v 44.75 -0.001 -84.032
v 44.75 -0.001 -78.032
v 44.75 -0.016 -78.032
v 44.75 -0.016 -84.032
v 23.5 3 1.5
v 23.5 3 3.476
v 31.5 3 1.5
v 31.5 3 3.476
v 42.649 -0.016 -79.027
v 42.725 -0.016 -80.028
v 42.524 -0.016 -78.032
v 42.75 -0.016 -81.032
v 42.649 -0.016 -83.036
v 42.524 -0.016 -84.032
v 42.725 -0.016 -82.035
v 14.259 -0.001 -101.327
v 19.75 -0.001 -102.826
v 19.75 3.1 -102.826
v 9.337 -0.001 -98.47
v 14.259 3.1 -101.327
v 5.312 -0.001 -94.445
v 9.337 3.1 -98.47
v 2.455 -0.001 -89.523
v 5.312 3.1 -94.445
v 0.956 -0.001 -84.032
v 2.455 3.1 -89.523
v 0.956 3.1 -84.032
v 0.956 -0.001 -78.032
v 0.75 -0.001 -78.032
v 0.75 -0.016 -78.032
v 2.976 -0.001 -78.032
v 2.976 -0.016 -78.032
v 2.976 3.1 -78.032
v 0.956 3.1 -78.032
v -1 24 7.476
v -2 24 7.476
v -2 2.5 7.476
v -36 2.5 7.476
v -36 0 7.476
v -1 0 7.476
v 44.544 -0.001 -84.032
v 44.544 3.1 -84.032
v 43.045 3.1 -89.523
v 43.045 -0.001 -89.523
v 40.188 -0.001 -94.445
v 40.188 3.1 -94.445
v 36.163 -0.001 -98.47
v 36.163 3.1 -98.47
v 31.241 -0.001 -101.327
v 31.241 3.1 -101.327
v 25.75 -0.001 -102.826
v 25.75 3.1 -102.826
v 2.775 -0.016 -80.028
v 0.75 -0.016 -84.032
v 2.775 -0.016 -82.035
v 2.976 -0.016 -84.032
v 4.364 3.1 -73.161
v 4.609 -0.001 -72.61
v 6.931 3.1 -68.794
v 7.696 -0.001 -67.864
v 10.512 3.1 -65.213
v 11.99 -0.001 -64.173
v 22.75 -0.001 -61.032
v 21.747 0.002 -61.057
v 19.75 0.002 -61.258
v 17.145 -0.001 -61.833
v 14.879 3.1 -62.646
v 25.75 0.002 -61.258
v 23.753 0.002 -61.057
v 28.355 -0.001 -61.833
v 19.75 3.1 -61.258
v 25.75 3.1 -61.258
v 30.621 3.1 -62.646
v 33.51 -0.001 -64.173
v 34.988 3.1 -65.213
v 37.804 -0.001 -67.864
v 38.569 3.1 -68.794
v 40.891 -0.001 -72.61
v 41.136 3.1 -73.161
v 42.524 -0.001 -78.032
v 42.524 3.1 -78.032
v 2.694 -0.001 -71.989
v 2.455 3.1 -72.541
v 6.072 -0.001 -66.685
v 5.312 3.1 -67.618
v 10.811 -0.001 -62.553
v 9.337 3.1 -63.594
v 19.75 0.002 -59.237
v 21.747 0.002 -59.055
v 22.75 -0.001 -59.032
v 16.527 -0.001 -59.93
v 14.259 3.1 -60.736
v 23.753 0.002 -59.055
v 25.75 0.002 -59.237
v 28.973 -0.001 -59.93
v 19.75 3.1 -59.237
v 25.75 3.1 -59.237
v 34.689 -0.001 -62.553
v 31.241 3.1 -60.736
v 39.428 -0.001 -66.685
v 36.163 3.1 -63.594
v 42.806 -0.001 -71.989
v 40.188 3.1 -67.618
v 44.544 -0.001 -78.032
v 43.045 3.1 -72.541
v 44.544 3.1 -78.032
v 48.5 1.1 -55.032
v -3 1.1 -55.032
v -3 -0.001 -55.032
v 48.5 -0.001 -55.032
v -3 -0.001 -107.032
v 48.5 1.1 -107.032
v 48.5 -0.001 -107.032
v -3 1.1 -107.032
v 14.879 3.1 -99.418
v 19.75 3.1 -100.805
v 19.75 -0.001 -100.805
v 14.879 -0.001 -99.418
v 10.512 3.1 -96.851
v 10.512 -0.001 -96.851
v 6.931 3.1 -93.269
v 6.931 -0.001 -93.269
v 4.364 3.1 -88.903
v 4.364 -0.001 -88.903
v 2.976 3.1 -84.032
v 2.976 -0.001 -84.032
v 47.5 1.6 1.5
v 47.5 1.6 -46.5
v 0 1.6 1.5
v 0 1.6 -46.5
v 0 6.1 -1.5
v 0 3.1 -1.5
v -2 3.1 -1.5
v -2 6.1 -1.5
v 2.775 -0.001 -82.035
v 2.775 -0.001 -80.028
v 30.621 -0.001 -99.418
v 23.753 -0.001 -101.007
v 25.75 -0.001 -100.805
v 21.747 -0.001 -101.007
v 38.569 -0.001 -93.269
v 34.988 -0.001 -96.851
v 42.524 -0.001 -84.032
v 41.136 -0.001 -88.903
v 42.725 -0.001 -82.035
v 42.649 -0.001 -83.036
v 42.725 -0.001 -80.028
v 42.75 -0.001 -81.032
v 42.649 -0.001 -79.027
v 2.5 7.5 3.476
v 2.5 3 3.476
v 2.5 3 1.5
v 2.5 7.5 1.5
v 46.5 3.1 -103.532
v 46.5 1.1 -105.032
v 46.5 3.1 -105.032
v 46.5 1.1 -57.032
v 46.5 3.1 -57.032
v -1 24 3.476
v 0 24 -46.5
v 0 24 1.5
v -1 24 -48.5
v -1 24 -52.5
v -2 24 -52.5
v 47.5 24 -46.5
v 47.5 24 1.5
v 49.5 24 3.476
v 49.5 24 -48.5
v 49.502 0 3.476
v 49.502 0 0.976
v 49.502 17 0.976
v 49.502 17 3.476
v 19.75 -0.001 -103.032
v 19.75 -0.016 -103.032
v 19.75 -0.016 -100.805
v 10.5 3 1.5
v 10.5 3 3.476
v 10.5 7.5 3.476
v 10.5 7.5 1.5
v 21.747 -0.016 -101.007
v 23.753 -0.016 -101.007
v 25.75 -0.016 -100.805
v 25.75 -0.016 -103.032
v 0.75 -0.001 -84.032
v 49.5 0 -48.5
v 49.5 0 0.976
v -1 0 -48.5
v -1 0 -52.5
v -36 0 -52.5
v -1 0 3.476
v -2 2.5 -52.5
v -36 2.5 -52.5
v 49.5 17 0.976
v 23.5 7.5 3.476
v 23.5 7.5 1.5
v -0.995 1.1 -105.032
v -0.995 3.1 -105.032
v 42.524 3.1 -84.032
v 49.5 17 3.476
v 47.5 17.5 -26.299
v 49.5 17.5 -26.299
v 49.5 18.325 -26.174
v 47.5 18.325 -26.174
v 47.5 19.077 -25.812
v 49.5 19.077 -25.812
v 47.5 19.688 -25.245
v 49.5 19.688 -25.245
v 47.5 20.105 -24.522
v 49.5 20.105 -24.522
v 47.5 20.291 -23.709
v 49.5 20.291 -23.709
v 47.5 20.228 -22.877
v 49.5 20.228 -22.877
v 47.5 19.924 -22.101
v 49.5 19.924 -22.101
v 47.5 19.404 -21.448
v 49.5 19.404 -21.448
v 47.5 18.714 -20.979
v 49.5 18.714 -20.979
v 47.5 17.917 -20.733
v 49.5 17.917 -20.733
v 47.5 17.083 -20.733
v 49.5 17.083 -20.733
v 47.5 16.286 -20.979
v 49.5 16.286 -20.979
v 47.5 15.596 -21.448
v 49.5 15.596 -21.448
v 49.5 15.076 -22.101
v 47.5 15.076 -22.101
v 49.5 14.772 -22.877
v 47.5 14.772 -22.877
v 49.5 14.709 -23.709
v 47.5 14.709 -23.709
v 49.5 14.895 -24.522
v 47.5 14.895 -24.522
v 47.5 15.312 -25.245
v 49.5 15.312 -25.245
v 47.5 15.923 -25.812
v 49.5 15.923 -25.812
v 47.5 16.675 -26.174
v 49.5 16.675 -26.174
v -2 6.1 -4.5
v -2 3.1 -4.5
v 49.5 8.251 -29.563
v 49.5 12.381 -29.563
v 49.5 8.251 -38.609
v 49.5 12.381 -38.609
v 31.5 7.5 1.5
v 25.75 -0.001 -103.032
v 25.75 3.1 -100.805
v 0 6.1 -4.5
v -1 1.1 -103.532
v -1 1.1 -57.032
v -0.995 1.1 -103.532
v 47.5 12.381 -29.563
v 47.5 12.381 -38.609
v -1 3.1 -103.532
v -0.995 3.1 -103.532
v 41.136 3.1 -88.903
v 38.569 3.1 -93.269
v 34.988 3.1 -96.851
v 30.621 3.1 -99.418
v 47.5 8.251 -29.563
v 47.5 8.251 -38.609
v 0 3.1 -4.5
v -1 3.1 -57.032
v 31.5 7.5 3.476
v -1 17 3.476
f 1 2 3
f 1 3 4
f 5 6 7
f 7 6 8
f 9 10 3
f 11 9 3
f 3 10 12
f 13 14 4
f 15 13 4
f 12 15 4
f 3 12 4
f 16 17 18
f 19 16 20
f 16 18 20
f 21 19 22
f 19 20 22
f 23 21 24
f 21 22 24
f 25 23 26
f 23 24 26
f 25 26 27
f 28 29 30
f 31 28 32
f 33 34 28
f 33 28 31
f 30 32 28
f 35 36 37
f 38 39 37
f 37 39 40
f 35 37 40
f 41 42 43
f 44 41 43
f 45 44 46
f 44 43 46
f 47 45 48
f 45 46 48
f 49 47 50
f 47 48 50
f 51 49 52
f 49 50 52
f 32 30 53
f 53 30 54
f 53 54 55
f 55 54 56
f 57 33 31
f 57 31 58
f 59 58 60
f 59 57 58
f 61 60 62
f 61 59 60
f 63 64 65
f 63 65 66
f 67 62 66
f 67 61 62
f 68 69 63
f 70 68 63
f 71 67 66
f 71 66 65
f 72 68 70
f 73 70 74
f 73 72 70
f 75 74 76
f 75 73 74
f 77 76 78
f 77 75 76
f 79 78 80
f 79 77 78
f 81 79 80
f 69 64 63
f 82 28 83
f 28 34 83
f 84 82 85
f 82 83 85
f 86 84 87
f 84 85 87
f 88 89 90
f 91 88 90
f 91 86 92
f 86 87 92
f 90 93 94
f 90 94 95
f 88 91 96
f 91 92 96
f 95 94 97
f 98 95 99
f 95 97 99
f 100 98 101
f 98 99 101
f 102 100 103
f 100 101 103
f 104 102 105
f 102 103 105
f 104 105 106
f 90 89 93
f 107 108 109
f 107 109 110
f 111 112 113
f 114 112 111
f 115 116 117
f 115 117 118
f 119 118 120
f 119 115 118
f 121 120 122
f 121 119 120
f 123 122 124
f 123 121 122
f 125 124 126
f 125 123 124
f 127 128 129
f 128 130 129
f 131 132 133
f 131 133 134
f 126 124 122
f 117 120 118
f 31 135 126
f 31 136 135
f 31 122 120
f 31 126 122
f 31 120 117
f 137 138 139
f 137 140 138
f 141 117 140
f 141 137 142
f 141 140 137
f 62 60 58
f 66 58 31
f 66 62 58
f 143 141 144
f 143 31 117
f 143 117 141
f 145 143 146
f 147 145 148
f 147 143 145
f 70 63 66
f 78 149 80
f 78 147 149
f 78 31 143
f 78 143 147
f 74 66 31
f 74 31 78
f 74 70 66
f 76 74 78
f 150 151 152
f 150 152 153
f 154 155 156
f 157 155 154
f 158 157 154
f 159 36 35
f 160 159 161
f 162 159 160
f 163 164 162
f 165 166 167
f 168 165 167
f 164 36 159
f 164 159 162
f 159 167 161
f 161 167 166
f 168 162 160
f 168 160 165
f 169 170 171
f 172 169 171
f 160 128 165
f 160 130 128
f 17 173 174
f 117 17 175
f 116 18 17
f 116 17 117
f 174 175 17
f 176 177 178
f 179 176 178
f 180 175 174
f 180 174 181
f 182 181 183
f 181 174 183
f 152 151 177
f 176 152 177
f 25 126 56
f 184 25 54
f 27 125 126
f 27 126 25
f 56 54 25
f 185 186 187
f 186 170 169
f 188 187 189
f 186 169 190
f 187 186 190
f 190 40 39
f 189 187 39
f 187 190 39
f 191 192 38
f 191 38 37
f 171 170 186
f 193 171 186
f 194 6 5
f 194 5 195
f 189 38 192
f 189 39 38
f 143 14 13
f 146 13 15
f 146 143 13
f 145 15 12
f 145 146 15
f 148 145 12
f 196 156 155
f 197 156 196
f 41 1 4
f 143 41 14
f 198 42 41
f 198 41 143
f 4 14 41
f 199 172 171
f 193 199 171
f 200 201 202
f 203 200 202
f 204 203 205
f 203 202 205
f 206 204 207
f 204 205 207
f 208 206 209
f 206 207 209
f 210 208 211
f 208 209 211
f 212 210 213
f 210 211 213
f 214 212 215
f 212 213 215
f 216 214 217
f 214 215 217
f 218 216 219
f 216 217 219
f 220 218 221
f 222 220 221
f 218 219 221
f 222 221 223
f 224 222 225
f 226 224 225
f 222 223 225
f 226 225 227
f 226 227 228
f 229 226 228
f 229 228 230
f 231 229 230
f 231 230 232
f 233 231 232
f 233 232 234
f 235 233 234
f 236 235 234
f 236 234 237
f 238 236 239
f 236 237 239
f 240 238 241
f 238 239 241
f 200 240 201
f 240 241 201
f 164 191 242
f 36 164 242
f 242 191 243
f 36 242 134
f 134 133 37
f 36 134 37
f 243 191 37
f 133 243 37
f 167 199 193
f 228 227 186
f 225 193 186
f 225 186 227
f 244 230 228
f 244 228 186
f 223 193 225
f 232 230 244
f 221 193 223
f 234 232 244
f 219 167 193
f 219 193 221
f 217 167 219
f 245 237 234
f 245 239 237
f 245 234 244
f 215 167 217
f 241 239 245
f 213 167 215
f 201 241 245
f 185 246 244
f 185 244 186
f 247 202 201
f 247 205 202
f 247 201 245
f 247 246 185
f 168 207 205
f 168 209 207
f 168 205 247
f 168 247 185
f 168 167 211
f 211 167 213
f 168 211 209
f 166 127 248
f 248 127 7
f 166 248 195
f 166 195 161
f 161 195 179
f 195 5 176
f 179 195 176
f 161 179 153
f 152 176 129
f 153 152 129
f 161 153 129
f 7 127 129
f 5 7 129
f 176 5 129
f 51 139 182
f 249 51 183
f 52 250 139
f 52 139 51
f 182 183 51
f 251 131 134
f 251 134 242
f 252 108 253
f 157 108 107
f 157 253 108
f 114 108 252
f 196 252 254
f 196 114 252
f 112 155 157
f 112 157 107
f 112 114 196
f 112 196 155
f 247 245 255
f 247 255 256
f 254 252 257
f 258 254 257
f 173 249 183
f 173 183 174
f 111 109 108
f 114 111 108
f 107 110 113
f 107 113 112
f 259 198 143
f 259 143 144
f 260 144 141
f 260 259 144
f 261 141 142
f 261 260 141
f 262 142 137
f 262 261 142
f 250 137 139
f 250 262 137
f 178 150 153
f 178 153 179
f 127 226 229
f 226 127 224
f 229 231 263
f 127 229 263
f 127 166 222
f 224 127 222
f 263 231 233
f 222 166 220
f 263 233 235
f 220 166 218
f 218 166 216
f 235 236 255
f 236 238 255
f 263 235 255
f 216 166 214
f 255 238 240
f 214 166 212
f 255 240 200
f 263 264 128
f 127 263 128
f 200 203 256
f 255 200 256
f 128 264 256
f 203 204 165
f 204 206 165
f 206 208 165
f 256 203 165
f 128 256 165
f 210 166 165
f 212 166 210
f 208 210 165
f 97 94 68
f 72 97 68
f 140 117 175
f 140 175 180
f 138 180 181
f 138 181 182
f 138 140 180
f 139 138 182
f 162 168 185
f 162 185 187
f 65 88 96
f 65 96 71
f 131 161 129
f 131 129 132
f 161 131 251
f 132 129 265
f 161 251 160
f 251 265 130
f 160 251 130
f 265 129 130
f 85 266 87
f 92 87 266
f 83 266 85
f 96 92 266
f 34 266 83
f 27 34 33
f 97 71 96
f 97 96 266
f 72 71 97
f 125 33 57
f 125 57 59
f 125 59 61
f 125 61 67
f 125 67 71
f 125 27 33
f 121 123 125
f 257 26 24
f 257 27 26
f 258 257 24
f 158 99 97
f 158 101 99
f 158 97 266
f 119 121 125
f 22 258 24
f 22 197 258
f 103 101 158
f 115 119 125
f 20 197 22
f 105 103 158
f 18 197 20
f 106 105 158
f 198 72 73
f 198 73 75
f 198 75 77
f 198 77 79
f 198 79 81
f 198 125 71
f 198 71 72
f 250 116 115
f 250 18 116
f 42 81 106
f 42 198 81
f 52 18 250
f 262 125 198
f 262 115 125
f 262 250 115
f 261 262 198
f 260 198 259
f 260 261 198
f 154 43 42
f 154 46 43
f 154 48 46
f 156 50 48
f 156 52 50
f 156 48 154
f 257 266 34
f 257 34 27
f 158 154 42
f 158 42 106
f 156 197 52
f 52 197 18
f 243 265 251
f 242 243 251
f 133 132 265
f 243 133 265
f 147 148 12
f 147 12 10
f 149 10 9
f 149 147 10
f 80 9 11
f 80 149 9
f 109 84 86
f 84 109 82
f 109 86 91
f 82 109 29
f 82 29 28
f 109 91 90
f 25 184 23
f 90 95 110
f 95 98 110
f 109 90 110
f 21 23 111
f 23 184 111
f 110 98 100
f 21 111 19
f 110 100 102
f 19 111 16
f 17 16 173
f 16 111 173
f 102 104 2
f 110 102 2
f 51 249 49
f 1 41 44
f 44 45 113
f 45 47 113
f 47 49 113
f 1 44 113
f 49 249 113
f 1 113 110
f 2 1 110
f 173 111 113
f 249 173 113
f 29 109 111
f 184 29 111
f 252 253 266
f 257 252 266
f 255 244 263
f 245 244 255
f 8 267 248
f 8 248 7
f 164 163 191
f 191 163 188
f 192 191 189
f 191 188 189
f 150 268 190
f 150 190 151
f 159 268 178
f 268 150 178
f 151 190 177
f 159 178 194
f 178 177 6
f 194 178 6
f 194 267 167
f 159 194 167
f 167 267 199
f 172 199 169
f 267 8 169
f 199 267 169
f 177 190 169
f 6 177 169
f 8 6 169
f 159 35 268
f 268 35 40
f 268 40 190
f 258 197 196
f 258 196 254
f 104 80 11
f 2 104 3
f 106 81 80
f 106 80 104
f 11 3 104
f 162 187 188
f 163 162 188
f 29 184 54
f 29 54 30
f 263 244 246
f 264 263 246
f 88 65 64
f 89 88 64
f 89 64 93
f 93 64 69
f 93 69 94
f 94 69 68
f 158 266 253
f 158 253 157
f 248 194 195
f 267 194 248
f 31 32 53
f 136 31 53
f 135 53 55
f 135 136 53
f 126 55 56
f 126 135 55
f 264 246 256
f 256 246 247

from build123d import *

# Parameters (mm, degrees)
SKETCH1_W                = 45.5
SKETCH1_H                = 45
BOSS_EXTRUDE1_DEPTH      = 1.6
SKETCH2_W                = 45.5
SKETCH2_H                = 45
BOSS_EXTRUDE2_DEPTH      = 24
SKETCH4_W                = 4
SKETCH4_H                = 1.7
CUT_EXTRUDE1_DEPTH       = 1.1
CUT_EXTRUDE3_DEPTH       = 1.1
SKETCH10_R               = 2.5079963
CUT_EXTRUDE4_DEPTH       = 1.1
BOSS_EXTRUDE3_DEPTH      = 0.001
BOSS_EXTRUDE3_DEPTH_BACK = 1.1
SKETCH11_W               = 47.5
SKETCH11_H               = 47
SKETCH13_W               = 45.5
SKETCH13_H               = 45
BOSS_EXTRUDE4_DEPTH      = 2
SKETCH14_R               = 22
SKETCH14_R_2             = 20
CUT_EXTRUDE6_DEPTH       = 13.441794669
SKETCH15_W               = 6
SKETCH15_H               = 7.443647067
BOSS_EXTRUDE6_DEPTH      = 3.097585302
BOSS_EXTRUDE10_DEPTH     = 3.116449364
BOSS_EXTRUDE11_DEPTH     = 1
SKETCH22_W               = 59.97606594
SKETCH22_H               = 1
BOSS_EXTRUDE12_DEPTH     = 34
CUT_EXTRUDE7_DEPTH       = 1.1
SKETCH23_W               = 3
SKETCH23_H               = 3
CUT_EXTRUDE8_DEPTH       = 5
SKETCH24_W               = 46.976120504
SKETCH24_H               = 24
BOSS_EXTRUDE13_DEPTH     = 3
SKETCH25_W               = 50.501685611
SKETCH25_H               = 17
BOSS_EXTRUDE14_DEPTH     = 2.5
SKETCH26_W               = 50.5
SKETCH26_H               = 24
BOSS_EXTRUDE15_DEPTH     = 2.5
SKETCH27_W               = 45.5
SKETCH27_H               = 22.4
CUT_EXTRUDE9_DEPTH       = 1.5
SKETCH28_W               = 45.5
SKETCH28_H               = 22.4
CUT_EXTRUDE10_DEPTH      = 1.5
CUT_EXTRUDE13_START      = -12.5
SKETCH31_R               = 2.5079963
SKETCH31_W               = 8
SKETCH31_H               = 3.5
CUT_EXTRUDE13_DEPTH      = 12.5
SKETCH32_W               = 48
SKETCH32_H               = 22.4
CUT_EXTRUDE14_DEPTH      = 2
SKETCH34_W               = 34
SKETCH34_H               = 59.97606594
BOSS_EXTRUDE16_DEPTH     = 1.5
SKETCH35_W               = 6
SKETCH35_H               = 3
CUT_EXTRUDE15_DEPTH      = 6.5
BOSS_EXTRUDE18_DEPTH     = 7
SKETCH47_W               = 45
SKETCH47_H               = 2
BOSS_EXTRUDE19_DEPTH     = 1
SKETCH49_W               = 45
SKETCH49_H               = 2
BOSS_EXTRUDE20_DEPTH     = 1
SKETCH51_W               = 48.225479337
SKETCH51_H               = 2
BOSS_EXTRUDE21_DEPTH     = 1.5
SKETCH53_W               = 48
SKETCH53_H               = 2
BOSS_EXTRUDE22_DEPTH     = 1.5
SKETCH54_W               = 47.5
SKETCH54_H               = 1.101
BOSS_EXTRUDE23_DEPTH     = 2
SKETCH55_W               = 49
SKETCH55_H               = 1.101
BOSS_EXTRUDE24_DEPTH     = 2
SKETCH56_W               = 49
SKETCH56_H               = 1.101
BOSS_EXTRUDE25_DEPTH     = 2
SKETCH57_W               = 51.5
SKETCH57_H               = 1.101
BOSS_EXTRUDE26_DEPTH     = 2
SKETCH58_W               = 51
SKETCH58_H               = 1.101
BOSS_EXTRUDE27_DEPTH     = 0.5
SKETCH59_W               = 51
SKETCH59_H               = 1.101
BOSS_EXTRUDE28_DEPTH     = 0.5
CUT_EXTRUDE29_START      = -0.5
CUT_EXTRUDE29_OUTLINE_W  = 51
CUT_EXTRUDE29_OUTLINE_H  = 1.101
CUT_EXTRUDE29_DEPTH      = 0.5
SKETCH64_W               = 52
SKETCH64_H               = 1.101
BOSS_EXTRUDE30_DEPTH     = 0.5
CUT_EXTRUDE31_START      = -0.5
CUT_EXTRUDE31_OUTLINE_W  = 51.5
CUT_EXTRUDE31_OUTLINE_H  = 1.101
CUT_EXTRUDE31_DEPTH      = 0.5
SKETCH66_W               = 51.5
SKETCH66_H               = 1.101
BOSS_EXTRUDE32_DEPTH     = 0.5
SKETCH67_W               = 8
SKETCH67_H               = 4.5
CUT_EXTRUDE16_DEPTH      = 10
BOSS_EXTRUDE34_START     = -2
SKETCH70_R               = 2.5079963
BOSS_EXTRUDE34_DEPTH     = 2
SKETCH69_R               = 2.798591497
CUT_EXTRUDE17_DEPTH      = 2
SKETCH80_W               = 8
SKETCH80_H               = 3.5
BOSS_EXTRUDE36_DEPTH     = 1
SKETCH80_2_W             = 8
SKETCH80_2_H             = 3.5
BOSS_EXTRUDE37_DEPTH     = 2
SKETCH80_3_W             = 8
SKETCH80_3_H             = 3.5
CUT_EXTRUDE34_DEPTH      = 2
SKETCH83_W               = 2.5
SKETCH83_H               = 7
CUT_EXTRUDE35_DEPTH      = 2
SKETCH77_W               = 9.045495133
SKETCH77_H               = 4.130087626
CUT_EXTRUDE36_DEPTH      = 2
SKETCH84_W               = 8.684162812
SKETCH84_H               = 3.956527075
BOSS_EXTRUDE38_DEPTH     = 2
SKETCH87_W               = 1.5
SKETCH87_H               = 2
CUT_EXTRUDE38_DEPTH      = 0.73
SKETCH89_W               = 1.5
SKETCH89_H               = 2
CUT_EXTRUDE39_DEPTH      = 0.5


# Read off the part's stored shape, not the designer's step: Cut-Extrude29, Cut-Extrude31
with BuildPart() as part:
    # Sketch1 → Boss-Extrude1 (new body)
    with BuildSketch(Plane(origin=(0, 0, 0), x_dir=(1, 0, 0), z_dir=(0, 1, 0))):
        with Locations((22.75, 22.5)):
            Rectangle(SKETCH1_W, SKETCH1_H)
    extrude(amount=BOSS_EXTRUDE1_DEPTH)

    # Sketch2 → Boss-Extrude2 (add)
    with BuildSketch(Plane.XZ):
        Polygon((0, -46), (46.5, -46), (46.5, -45), (46.5, 0), (46.5, 0.976120504), (0, 0.976120504), (-1, 0.976120504), (-1, -46), align=None)
        with Locations((22.75, -22.5)):
            Rectangle(SKETCH2_W, SKETCH2_H, mode=Mode.SUBTRACT)
    extrude(amount=-BOSS_EXTRUDE2_DEPTH)

    # Sketch4 → Cut-Extrude1 (cut)
    with BuildSketch(Plane.XY.offset(0.976120504)):
        with Locations((4, 3.85)):
            Rectangle(SKETCH4_W, SKETCH4_H)
        with Locations((25, 3.85)):
            Rectangle(SKETCH4_W, SKETCH4_H)
    extrude(amount=-CUT_EXTRUDE1_DEPTH, mode=Mode.SUBTRACT)

    # Sketch9 → Cut-Extrude3 (cut)
    with BuildSketch(Plane(origin=(46.5, 0, 0), x_dir=(0, 0, -1), z_dir=(1, 0, 0))):
        Polygon((36, 4.5), (39.355507427, 4.5), (39.355507427, 8), (31.355507427, 8), (31.355507427, 4.5), align=None)
    extrude(amount=-CUT_EXTRUDE3_DEPTH, mode=Mode.SUBTRACT)

    # Sketch10 → Cut-Extrude4 (cut)
    with BuildSketch(Plane(origin=(46.5, 0, 0), x_dir=(0, 0, -1), z_dir=(1, 0, 0))):
        with Locations((24.5, 13.5)):
            Circle(SKETCH10_R)
    extrude(amount=-CUT_EXTRUDE4_DEPTH, mode=Mode.SUBTRACT)

    # Sketch21 → Boss-Extrude11 (add)
    with BuildSketch(Plane.ZY.offset(1)):
        Polygon((-46, 0), (-52.499972718, 0), (-52.499972718, 17), (7.476093222, 17), (7.476093222, 0), (0.976120504, 0), align=None)
    extrude(amount=BOSS_EXTRUDE11_DEPTH)

    # Sketch22 → Boss-Extrude12 (add)
    with BuildSketch(Plane.ZY.offset(2)):
        with Locations((-22.511939748, 0.5)):
            Rectangle(SKETCH22_W, SKETCH22_H)
    extrude(amount=BOSS_EXTRUDE12_DEPTH)

    # Sketch6 → Cut-Extrude7 (cut)
    with BuildSketch(Plane.XY.offset(0.976120504)):
        Polygon((15, 3), (17.895490388, 3), (17.895490388, 4.5), (12.317203257, 4.5), (12.317203257, 3), align=None)
    extrude(amount=-CUT_EXTRUDE7_DEPTH, mode=Mode.SUBTRACT)

    # Sketch23 → Cut-Extrude8 (cut)
    with BuildSketch(Plane(origin=(0, 0, 0), x_dir=(0, 0, -1), z_dir=(1, 0, 0))):
        with Locations((3, 4.6)):
            Rectangle(SKETCH23_W, SKETCH23_H)
    extrude(amount=-CUT_EXTRUDE8_DEPTH, mode=Mode.SUBTRACT)

    # Sketch24 → Boss-Extrude13 (add)
    with BuildSketch(Plane(origin=(46.5, 0, 0), x_dir=(0, 0, -1), z_dir=(1, 0, 0))):
        with Locations((22.511939748, 12)):
            Rectangle(SKETCH24_W, SKETCH24_H)
    extrude(amount=BOSS_EXTRUDE13_DEPTH)

    # Sketch25 → Boss-Extrude14 (add)
    with BuildSketch(Plane.XY.offset(0.976120504)):
        with Locations((24.250842806, 8.5)):
            Rectangle(SKETCH25_W, SKETCH25_H)
    extrude(amount=BOSS_EXTRUDE14_DEPTH)

    # Sketch26 → Boss-Extrude15 (add)
    with BuildSketch(Plane(origin=(0, 0, -46), x_dir=(-1, 0, 0), z_dir=(0, 0, -1))):
        with Locations((-24.25, 12)):
            Rectangle(SKETCH26_W, SKETCH26_H)
    extrude(amount=BOSS_EXTRUDE15_DEPTH)

    # Sketch27 → Cut-Extrude9 (cut)
    with BuildSketch(Plane.XY.offset(-45)):
        with Locations((22.75, 12.8)):
            Rectangle(SKETCH27_W, SKETCH27_H)
    extrude(amount=-CUT_EXTRUDE9_DEPTH, mode=Mode.SUBTRACT)

    # Sketch28 → Cut-Extrude10 (cut)
    with BuildSketch(Plane(origin=(0, 0, 0), x_dir=(-1, 0, 0), z_dir=(0, 0, -1))):
        with Locations((-22.75, 12.8)):
            Rectangle(SKETCH28_W, SKETCH28_H)
    extrude(amount=-CUT_EXTRUDE10_DEPTH, mode=Mode.SUBTRACT)

    # Sketch31 → Cut-Extrude13 (cut)
    with BuildSketch(Plane.ZY.offset(-46.5).offset(CUT_EXTRUDE13_START)):
        with Locations(Location((-24.5, 13.5, 0), (0, 0, 180))):
            Circle(SKETCH31_R)
        with Locations((-35.355507427, 6.25)):
            Rectangle(SKETCH31_W, SKETCH31_H)
    extrude(amount=CUT_EXTRUDE13_DEPTH, mode=Mode.SUBTRACT)

    # Sketch32 → Cut-Extrude14 (cut)
    with BuildSketch(Plane.ZY.offset(-45.5)):
        with Locations((-22.5, 12.8)):
            Rectangle(SKETCH32_W, SKETCH32_H)
    extrude(amount=-CUT_EXTRUDE14_DEPTH, mode=Mode.SUBTRACT)

    # Sketch34 → Boss-Extrude16 (add)
    with BuildSketch(Plane(origin=(0, 1, 0), x_dir=(1, 0, 0), z_dir=(0, 1, 0))):
        with Locations((-19, 22.511939748)):
            Rectangle(SKETCH34_W, SKETCH34_H)
    extrude(amount=BOSS_EXTRUDE16_DEPTH)

    # Sketch35 → Cut-Extrude15 (cut)
    with BuildSketch(Plane.XY.offset(3.476120504)):
        with Locations((5.5, 4.5)):
            Rectangle(SKETCH35_W, SKETCH35_H)
        with Locations((27.5, 4.5)):
            Rectangle(SKETCH35_W, SKETCH35_H)
    extrude(amount=-CUT_EXTRUDE15_DEPTH, mode=Mode.SUBTRACT)

    # Sketch39 → Boss-Extrude18 (add)
    with BuildSketch(Plane(origin=(0, 17, 0), x_dir=(1, 0, 0), z_dir=(0, 1, 0))):
        Polygon((-2, -7.476093222), (-1, -7.476093222), (-1, -3.476120504), (51.5, -3.476120504), (51.5, -0.976120504), (47.5, -0.976120504), (47.5, -1.5), (0, -1.5), (0, -0.976120504), (-1, -0.976120504), (-1, 52.499972718), (-2, 52.499972718), align=None)
    extrude(amount=BOSS_EXTRUDE18_DEPTH)

    # Sketch67 → Cut-Extrude16 (cut)
    with BuildSketch(Plane.XY.offset(3.476120504)):
        Polygon((27.5, 3), (23.5, 3), (23.5, 7.5), (31.5, 7.5), (31.5, 3), align=None)
        with Locations((6.5, 5.25)):
            Rectangle(SKETCH67_W, SKETCH67_H)
    extrude(amount=-CUT_EXTRUDE16_DEPTH, mode=Mode.SUBTRACT)

    # Sketch70 → Boss-Extrude34 (add)
    with BuildSketch(Plane(origin=(49.5, 0, 0), x_dir=(0, 0, -1), z_dir=(1, 0, 0)).offset(BOSS_EXTRUDE34_START)):
        with Locations((24.5, 13.5)):
            Circle(SKETCH70_R)
    extrude(amount=BOSS_EXTRUDE34_DEPTH)

    # Sketch69 → Cut-Extrude17 (cut)
    with BuildSketch(Plane(origin=(49.5, 0, 0), x_dir=(0, 0, -1), z_dir=(1, 0, 0))):
        with Locations((23.5, 17.5)):
            Circle(SKETCH69_R)
    extrude(amount=-CUT_EXTRUDE17_DEPTH, mode=Mode.SUBTRACT)

    # Sketch80 → Boss-Extrude36 (add)
    with BuildSketch(Plane(origin=(49.5, 0, 0), x_dir=(0, 0, -1), z_dir=(1, 0, 0))):
        with Locations((35.355507427, 6.25)):
            Rectangle(SKETCH80_W, SKETCH80_H)
    extrude(amount=-BOSS_EXTRUDE36_DEPTH)

    # Sketch80<2> → Boss-Extrude37 (add)
    with BuildSketch(Plane(origin=(49.5, 0, 0), x_dir=(0, 0, -1), z_dir=(1, 0, 0))):
        with Locations((35.355507427, 6.25)):
            Rectangle(SKETCH80_2_W, SKETCH80_2_H)
    extrude(amount=-BOSS_EXTRUDE37_DEPTH)

    # Sketch80<3> → Cut-Extrude34 (cut)
    with BuildSketch(Plane(origin=(49.5, 0, 0), x_dir=(0, 0, -1), z_dir=(1, 0, 0))):
        with Locations((35.355507427, 6.25)):
            Rectangle(SKETCH80_3_W, SKETCH80_3_H)
    extrude(amount=-CUT_EXTRUDE34_DEPTH, mode=Mode.SUBTRACT)

    # Sketch83 → Cut-Extrude35 (cut)
    with BuildSketch(Plane(origin=(51.5, 0, 0), x_dir=(0, 0, -1), z_dir=(1, 0, 0))):
        with Locations((-2.226120504, 20.5)):
            Rectangle(SKETCH83_W, SKETCH83_H)
    extrude(amount=-CUT_EXTRUDE35_DEPTH, mode=Mode.SUBTRACT)

    # Sketch77 → Cut-Extrude36 (cut)
    with BuildSketch(Plane(origin=(49.5, 0, 0), x_dir=(0, 0, -1), z_dir=(1, 0, 0))):
        with Locations((34.086201301, 10.316065325)):
            Rectangle(SKETCH77_W, SKETCH77_H)
    extrude(amount=-CUT_EXTRUDE36_DEPTH, mode=Mode.SUBTRACT)

    # Sketch84 → Boss-Extrude38 (add)
    with BuildSketch(Plane(origin=(49.5, 0, 0), x_dir=(0, 0, -1), z_dir=(1, 0, 0))):
        with Locations((35.013426021, 6.021736462)):
            Rectangle(SKETCH84_W, SKETCH84_H)
    extrude(amount=-BOSS_EXTRUDE38_DEPTH)


with BuildPart() as body_2:
    # Sketch11 → Boss-Extrude3 (new, two sides: drawn at the far end of the back side and taken through both)
    with BuildSketch(Plane.XZ.offset(-BOSS_EXTRUDE3_DEPTH_BACK)):
        with Locations((22.75, -81.03168978)):
            Rectangle(SKETCH11_W, SKETCH11_H)
    extrude(amount=BOSS_EXTRUDE3_DEPTH + BOSS_EXTRUDE3_DEPTH_BACK)

    # Sketch13 → Boss-Extrude4 (add)
    with BuildSketch(Plane(origin=(0, 1.1, 0), x_dir=(1, 0, 0), z_dir=(0, 1, 0))):
        with Locations((22.75, 81.03168978)):
            Rectangle(SKETCH13_W, SKETCH13_H)
    extrude(amount=BOSS_EXTRUDE4_DEPTH)

    # Sketch14 → Cut-Extrude6 (cut)
    with BuildSketch(Plane(origin=(0, 3.1, 0), x_dir=(1, 0, 0), z_dir=(0, 1, 0))):
        with Locations(Location((22.75, 81.03168978, 0), (0, 0, 270))):
            Circle(SKETCH14_R)
        with Locations(Location((22.75, 81.03168978, 0), (0, 0, 270))):
            Circle(SKETCH14_R_2, mode=Mode.SUBTRACT)
    extrude(amount=-CUT_EXTRUDE6_DEPTH, mode=Mode.SUBTRACT)


with BuildPart() as cut_extrude6_piece_1:
    # of the separate pieces the step leaves, piece 1, a body of its own (cut_extrude6_pieces)
    add(body_2.part.solids().sort_by_distance((22.75, -0.001, -61.03168978))[0])



with BuildPart() as cut_extrude6_piece_2:
    # of the separate pieces the step leaves, piece 2, a body of its own (cut_extrude6_pieces)
    add(body_2.part.solids().sort_by_distance((-1, -0.001, -57.53168978))[0])


with BuildPart() as cut_extrude6_piece_1_1:
    add(cut_extrude6_piece_1.part)

    add(cut_extrude6_piece_2.part)  # Boss-Extrude6 merges Cut-Extrude6 piece 2
    # Sketch15 → Boss-Extrude6 (add)
    with BuildSketch(Plane(origin=(0, 3.1, 0), x_dir=(1, 0, 0), z_dir=(0, 1, 0))):
        with Locations((22.75, 62.753513314)):
            Rectangle(SKETCH15_W, SKETCH15_H)
    extrude(amount=-BOSS_EXTRUDE6_DEPTH)

    # Sketch16 → Boss-Extrude10 (add)
    with BuildSketch(Plane(origin=(0, 3.1, 0), x_dir=(1, 0, 0), z_dir=(0, 1, 0))):
        with BuildLine():
            ThreePointArc((2.976280067, 78.03168978), (2.75, 81.03168978), (2.976280067, 84.03168978))
            Line((2.976280067, 84.03168978), (0.75, 84.03168978))
            Line((0.75, 84.03168978), (0.75, 81.03168978))
            Line((0.75, 81.03168978), (0.75, 78.03168978))
            Line((0.75, 78.03168978), (2.976280067, 78.03168978))
        make_face()
        with BuildLine():
            Line((25.75, 103.03168978), (22.75, 103.03168978))
            Line((22.75, 103.03168978), (19.75, 103.03168978))
            Line((19.75, 103.03168978), (19.75, 100.805409714))
            ThreePointArc((19.75, 100.805409714), (22.75, 101.03168978), (25.75, 100.805409714))
            Line((25.75, 100.805409714), (25.75, 103.03168978))
        make_face()
        with BuildLine():
            Line((44.75, 84.03168978), (42.523719933, 84.03168978))
            ThreePointArc((42.523719933, 84.03168978), (42.693349752, 82.535950618), (42.75, 81.03168978))
            ThreePointArc((42.75, 81.03168978), (42.693349752, 79.527428943), (42.523719933, 78.03168978))
            Line((42.523719933, 78.03168978), (44.75, 78.03168978))
            Line((44.75, 78.03168978), (44.75, 81.03168978))
            Line((44.75, 81.03168978), (44.75, 84.03168978))
        make_face()
    extrude(amount=-BOSS_EXTRUDE10_DEPTH)

    # Sketch47 → Boss-Extrude19 (add)
    with BuildSketch(Plane(origin=(45.5, 0, 0), x_dir=(0, 0, -1), z_dir=(1, 0, 0))):
        with Locations((81.03168978, 2.1)):
            Rectangle(SKETCH47_W, SKETCH47_H)
    extrude(amount=BOSS_EXTRUDE19_DEPTH)

    # Sketch49 → Boss-Extrude20 (add)
    with BuildSketch(Plane.ZY):
        with Locations((-81.03168978, 2.1)):
            Rectangle(SKETCH49_W, SKETCH49_H)
    extrude(amount=BOSS_EXTRUDE20_DEPTH)

    # Sketch51 → Boss-Extrude21 (add)
    with BuildSketch(Plane(origin=(0, 0, -103.53168978), x_dir=(-1, 0, 0), z_dir=(0, 0, -1))):
        with Locations((-22.387260331, 2.1)):
            Rectangle(SKETCH51_W, SKETCH51_H)
    extrude(amount=BOSS_EXTRUDE21_DEPTH)

    # Sketch53 → Boss-Extrude22 (add)
    with BuildSketch(Plane.XY.offset(-58.53168978)):
        with Locations((23, 2.1)):
            Rectangle(SKETCH53_W, SKETCH53_H)
    extrude(amount=BOSS_EXTRUDE22_DEPTH)

    # Sketch54 → Boss-Extrude23 (add)
    with BuildSketch(Plane(origin=(0, 0, -104.53168978), x_dir=(-1, 0, 0), z_dir=(0, 0, -1))):
        with Locations((-22.75, 0.5495)):
            Rectangle(SKETCH54_W, SKETCH54_H)
    extrude(amount=BOSS_EXTRUDE23_DEPTH)

    # Sketch55 → Boss-Extrude24 (add)
    with BuildSketch(Plane.ZY.offset(1)):
        with Locations((-82.03168978, 0.5495)):
            Rectangle(SKETCH55_W, SKETCH55_H)
    extrude(amount=BOSS_EXTRUDE24_DEPTH)

    # Sketch56 → Boss-Extrude25 (add)
    with BuildSketch(Plane(origin=(46.5, 0, 0), x_dir=(0, 0, -1), z_dir=(1, 0, 0))):
        with Locations((82.03168978, 0.5495)):
            Rectangle(SKETCH56_W, SKETCH56_H)
    extrude(amount=BOSS_EXTRUDE25_DEPTH)

    # Sketch57 → Boss-Extrude26 (add)
    with BuildSketch(Plane.XY.offset(-57.53168978)):
        with Locations((22.75, 0.5495)):
            Rectangle(SKETCH57_W, SKETCH57_H)
    extrude(amount=BOSS_EXTRUDE26_DEPTH)

    # Sketch58 → Boss-Extrude27 (add)
    with BuildSketch(Plane(origin=(48.5, 0, 0), x_dir=(0, 0, -1), z_dir=(1, 0, 0))):
        with Locations((81.03168978, 0.5495)):
            Rectangle(SKETCH58_W, SKETCH58_H)
    extrude(amount=BOSS_EXTRUDE27_DEPTH)

    # Sketch59 → Boss-Extrude28 (add)
    with BuildSketch(Plane.ZY.offset(3)):
        with Locations((-81.03168978, 0.5495)):
            Rectangle(SKETCH59_W, SKETCH59_H)
    extrude(amount=BOSS_EXTRUDE28_DEPTH)

    # Cut-Extrude29 outline → Cut-Extrude29 (cut)
    with BuildSketch(Plane(origin=(49, 0, 0), x_dir=(0, 0, -1), z_dir=(1, 0, 0)).offset(CUT_EXTRUDE29_START)):
        with Locations((81.03168978, 0.5495)):
            Rectangle(CUT_EXTRUDE29_OUTLINE_W, CUT_EXTRUDE29_OUTLINE_H)
    extrude(amount=CUT_EXTRUDE29_DEPTH, mode=Mode.SUBTRACT)

    # Sketch64 → Boss-Extrude30 (add)
    with BuildSketch(Plane(origin=(0, 0, -106.53168978), x_dir=(-1, 0, 0), z_dir=(0, 0, -1))):
        with Locations((-22.5, 0.5495)):
            Rectangle(SKETCH64_W, SKETCH64_H)
    extrude(amount=BOSS_EXTRUDE30_DEPTH)

    # Cut-Extrude31 outline → Cut-Extrude31 (cut)
    with BuildSketch(Plane.ZY.offset(3.5).offset(CUT_EXTRUDE31_START)):
        with Locations((-81.28168978, 0.5495)):
            Rectangle(CUT_EXTRUDE31_OUTLINE_W, CUT_EXTRUDE31_OUTLINE_H)
    extrude(amount=CUT_EXTRUDE31_DEPTH, mode=Mode.SUBTRACT)

    # Sketch66 → Boss-Extrude32 (add)
    with BuildSketch(Plane.XY.offset(-55.53168978)):
        with Locations((22.75, 0.5495)):
            Rectangle(SKETCH66_W, SKETCH66_H)
    extrude(amount=BOSS_EXTRUDE32_DEPTH)

    # Sketch87 → Cut-Extrude38 (cut)
    with BuildSketch(Plane.ZY.offset(1.725479337)):
        with Locations((-104.28168978, 2.1)):
            Rectangle(SKETCH87_W, SKETCH87_H)
    extrude(amount=-CUT_EXTRUDE38_DEPTH, mode=Mode.SUBTRACT)

    # Sketch89 → Cut-Extrude39 (cut)
    with BuildSketch(Plane(origin=(47, 0, 0), x_dir=(0, 0, -1), z_dir=(1, 0, 0))):
        with Locations((57.78168978, 2.1)):
            Rectangle(SKETCH89_W, SKETCH89_H)
    extrude(amount=-CUT_EXTRUDE39_DEPTH, mode=Mode.SUBTRACT)


solid = Compound([part.part, cut_extrude6_piece_1_1.part])
